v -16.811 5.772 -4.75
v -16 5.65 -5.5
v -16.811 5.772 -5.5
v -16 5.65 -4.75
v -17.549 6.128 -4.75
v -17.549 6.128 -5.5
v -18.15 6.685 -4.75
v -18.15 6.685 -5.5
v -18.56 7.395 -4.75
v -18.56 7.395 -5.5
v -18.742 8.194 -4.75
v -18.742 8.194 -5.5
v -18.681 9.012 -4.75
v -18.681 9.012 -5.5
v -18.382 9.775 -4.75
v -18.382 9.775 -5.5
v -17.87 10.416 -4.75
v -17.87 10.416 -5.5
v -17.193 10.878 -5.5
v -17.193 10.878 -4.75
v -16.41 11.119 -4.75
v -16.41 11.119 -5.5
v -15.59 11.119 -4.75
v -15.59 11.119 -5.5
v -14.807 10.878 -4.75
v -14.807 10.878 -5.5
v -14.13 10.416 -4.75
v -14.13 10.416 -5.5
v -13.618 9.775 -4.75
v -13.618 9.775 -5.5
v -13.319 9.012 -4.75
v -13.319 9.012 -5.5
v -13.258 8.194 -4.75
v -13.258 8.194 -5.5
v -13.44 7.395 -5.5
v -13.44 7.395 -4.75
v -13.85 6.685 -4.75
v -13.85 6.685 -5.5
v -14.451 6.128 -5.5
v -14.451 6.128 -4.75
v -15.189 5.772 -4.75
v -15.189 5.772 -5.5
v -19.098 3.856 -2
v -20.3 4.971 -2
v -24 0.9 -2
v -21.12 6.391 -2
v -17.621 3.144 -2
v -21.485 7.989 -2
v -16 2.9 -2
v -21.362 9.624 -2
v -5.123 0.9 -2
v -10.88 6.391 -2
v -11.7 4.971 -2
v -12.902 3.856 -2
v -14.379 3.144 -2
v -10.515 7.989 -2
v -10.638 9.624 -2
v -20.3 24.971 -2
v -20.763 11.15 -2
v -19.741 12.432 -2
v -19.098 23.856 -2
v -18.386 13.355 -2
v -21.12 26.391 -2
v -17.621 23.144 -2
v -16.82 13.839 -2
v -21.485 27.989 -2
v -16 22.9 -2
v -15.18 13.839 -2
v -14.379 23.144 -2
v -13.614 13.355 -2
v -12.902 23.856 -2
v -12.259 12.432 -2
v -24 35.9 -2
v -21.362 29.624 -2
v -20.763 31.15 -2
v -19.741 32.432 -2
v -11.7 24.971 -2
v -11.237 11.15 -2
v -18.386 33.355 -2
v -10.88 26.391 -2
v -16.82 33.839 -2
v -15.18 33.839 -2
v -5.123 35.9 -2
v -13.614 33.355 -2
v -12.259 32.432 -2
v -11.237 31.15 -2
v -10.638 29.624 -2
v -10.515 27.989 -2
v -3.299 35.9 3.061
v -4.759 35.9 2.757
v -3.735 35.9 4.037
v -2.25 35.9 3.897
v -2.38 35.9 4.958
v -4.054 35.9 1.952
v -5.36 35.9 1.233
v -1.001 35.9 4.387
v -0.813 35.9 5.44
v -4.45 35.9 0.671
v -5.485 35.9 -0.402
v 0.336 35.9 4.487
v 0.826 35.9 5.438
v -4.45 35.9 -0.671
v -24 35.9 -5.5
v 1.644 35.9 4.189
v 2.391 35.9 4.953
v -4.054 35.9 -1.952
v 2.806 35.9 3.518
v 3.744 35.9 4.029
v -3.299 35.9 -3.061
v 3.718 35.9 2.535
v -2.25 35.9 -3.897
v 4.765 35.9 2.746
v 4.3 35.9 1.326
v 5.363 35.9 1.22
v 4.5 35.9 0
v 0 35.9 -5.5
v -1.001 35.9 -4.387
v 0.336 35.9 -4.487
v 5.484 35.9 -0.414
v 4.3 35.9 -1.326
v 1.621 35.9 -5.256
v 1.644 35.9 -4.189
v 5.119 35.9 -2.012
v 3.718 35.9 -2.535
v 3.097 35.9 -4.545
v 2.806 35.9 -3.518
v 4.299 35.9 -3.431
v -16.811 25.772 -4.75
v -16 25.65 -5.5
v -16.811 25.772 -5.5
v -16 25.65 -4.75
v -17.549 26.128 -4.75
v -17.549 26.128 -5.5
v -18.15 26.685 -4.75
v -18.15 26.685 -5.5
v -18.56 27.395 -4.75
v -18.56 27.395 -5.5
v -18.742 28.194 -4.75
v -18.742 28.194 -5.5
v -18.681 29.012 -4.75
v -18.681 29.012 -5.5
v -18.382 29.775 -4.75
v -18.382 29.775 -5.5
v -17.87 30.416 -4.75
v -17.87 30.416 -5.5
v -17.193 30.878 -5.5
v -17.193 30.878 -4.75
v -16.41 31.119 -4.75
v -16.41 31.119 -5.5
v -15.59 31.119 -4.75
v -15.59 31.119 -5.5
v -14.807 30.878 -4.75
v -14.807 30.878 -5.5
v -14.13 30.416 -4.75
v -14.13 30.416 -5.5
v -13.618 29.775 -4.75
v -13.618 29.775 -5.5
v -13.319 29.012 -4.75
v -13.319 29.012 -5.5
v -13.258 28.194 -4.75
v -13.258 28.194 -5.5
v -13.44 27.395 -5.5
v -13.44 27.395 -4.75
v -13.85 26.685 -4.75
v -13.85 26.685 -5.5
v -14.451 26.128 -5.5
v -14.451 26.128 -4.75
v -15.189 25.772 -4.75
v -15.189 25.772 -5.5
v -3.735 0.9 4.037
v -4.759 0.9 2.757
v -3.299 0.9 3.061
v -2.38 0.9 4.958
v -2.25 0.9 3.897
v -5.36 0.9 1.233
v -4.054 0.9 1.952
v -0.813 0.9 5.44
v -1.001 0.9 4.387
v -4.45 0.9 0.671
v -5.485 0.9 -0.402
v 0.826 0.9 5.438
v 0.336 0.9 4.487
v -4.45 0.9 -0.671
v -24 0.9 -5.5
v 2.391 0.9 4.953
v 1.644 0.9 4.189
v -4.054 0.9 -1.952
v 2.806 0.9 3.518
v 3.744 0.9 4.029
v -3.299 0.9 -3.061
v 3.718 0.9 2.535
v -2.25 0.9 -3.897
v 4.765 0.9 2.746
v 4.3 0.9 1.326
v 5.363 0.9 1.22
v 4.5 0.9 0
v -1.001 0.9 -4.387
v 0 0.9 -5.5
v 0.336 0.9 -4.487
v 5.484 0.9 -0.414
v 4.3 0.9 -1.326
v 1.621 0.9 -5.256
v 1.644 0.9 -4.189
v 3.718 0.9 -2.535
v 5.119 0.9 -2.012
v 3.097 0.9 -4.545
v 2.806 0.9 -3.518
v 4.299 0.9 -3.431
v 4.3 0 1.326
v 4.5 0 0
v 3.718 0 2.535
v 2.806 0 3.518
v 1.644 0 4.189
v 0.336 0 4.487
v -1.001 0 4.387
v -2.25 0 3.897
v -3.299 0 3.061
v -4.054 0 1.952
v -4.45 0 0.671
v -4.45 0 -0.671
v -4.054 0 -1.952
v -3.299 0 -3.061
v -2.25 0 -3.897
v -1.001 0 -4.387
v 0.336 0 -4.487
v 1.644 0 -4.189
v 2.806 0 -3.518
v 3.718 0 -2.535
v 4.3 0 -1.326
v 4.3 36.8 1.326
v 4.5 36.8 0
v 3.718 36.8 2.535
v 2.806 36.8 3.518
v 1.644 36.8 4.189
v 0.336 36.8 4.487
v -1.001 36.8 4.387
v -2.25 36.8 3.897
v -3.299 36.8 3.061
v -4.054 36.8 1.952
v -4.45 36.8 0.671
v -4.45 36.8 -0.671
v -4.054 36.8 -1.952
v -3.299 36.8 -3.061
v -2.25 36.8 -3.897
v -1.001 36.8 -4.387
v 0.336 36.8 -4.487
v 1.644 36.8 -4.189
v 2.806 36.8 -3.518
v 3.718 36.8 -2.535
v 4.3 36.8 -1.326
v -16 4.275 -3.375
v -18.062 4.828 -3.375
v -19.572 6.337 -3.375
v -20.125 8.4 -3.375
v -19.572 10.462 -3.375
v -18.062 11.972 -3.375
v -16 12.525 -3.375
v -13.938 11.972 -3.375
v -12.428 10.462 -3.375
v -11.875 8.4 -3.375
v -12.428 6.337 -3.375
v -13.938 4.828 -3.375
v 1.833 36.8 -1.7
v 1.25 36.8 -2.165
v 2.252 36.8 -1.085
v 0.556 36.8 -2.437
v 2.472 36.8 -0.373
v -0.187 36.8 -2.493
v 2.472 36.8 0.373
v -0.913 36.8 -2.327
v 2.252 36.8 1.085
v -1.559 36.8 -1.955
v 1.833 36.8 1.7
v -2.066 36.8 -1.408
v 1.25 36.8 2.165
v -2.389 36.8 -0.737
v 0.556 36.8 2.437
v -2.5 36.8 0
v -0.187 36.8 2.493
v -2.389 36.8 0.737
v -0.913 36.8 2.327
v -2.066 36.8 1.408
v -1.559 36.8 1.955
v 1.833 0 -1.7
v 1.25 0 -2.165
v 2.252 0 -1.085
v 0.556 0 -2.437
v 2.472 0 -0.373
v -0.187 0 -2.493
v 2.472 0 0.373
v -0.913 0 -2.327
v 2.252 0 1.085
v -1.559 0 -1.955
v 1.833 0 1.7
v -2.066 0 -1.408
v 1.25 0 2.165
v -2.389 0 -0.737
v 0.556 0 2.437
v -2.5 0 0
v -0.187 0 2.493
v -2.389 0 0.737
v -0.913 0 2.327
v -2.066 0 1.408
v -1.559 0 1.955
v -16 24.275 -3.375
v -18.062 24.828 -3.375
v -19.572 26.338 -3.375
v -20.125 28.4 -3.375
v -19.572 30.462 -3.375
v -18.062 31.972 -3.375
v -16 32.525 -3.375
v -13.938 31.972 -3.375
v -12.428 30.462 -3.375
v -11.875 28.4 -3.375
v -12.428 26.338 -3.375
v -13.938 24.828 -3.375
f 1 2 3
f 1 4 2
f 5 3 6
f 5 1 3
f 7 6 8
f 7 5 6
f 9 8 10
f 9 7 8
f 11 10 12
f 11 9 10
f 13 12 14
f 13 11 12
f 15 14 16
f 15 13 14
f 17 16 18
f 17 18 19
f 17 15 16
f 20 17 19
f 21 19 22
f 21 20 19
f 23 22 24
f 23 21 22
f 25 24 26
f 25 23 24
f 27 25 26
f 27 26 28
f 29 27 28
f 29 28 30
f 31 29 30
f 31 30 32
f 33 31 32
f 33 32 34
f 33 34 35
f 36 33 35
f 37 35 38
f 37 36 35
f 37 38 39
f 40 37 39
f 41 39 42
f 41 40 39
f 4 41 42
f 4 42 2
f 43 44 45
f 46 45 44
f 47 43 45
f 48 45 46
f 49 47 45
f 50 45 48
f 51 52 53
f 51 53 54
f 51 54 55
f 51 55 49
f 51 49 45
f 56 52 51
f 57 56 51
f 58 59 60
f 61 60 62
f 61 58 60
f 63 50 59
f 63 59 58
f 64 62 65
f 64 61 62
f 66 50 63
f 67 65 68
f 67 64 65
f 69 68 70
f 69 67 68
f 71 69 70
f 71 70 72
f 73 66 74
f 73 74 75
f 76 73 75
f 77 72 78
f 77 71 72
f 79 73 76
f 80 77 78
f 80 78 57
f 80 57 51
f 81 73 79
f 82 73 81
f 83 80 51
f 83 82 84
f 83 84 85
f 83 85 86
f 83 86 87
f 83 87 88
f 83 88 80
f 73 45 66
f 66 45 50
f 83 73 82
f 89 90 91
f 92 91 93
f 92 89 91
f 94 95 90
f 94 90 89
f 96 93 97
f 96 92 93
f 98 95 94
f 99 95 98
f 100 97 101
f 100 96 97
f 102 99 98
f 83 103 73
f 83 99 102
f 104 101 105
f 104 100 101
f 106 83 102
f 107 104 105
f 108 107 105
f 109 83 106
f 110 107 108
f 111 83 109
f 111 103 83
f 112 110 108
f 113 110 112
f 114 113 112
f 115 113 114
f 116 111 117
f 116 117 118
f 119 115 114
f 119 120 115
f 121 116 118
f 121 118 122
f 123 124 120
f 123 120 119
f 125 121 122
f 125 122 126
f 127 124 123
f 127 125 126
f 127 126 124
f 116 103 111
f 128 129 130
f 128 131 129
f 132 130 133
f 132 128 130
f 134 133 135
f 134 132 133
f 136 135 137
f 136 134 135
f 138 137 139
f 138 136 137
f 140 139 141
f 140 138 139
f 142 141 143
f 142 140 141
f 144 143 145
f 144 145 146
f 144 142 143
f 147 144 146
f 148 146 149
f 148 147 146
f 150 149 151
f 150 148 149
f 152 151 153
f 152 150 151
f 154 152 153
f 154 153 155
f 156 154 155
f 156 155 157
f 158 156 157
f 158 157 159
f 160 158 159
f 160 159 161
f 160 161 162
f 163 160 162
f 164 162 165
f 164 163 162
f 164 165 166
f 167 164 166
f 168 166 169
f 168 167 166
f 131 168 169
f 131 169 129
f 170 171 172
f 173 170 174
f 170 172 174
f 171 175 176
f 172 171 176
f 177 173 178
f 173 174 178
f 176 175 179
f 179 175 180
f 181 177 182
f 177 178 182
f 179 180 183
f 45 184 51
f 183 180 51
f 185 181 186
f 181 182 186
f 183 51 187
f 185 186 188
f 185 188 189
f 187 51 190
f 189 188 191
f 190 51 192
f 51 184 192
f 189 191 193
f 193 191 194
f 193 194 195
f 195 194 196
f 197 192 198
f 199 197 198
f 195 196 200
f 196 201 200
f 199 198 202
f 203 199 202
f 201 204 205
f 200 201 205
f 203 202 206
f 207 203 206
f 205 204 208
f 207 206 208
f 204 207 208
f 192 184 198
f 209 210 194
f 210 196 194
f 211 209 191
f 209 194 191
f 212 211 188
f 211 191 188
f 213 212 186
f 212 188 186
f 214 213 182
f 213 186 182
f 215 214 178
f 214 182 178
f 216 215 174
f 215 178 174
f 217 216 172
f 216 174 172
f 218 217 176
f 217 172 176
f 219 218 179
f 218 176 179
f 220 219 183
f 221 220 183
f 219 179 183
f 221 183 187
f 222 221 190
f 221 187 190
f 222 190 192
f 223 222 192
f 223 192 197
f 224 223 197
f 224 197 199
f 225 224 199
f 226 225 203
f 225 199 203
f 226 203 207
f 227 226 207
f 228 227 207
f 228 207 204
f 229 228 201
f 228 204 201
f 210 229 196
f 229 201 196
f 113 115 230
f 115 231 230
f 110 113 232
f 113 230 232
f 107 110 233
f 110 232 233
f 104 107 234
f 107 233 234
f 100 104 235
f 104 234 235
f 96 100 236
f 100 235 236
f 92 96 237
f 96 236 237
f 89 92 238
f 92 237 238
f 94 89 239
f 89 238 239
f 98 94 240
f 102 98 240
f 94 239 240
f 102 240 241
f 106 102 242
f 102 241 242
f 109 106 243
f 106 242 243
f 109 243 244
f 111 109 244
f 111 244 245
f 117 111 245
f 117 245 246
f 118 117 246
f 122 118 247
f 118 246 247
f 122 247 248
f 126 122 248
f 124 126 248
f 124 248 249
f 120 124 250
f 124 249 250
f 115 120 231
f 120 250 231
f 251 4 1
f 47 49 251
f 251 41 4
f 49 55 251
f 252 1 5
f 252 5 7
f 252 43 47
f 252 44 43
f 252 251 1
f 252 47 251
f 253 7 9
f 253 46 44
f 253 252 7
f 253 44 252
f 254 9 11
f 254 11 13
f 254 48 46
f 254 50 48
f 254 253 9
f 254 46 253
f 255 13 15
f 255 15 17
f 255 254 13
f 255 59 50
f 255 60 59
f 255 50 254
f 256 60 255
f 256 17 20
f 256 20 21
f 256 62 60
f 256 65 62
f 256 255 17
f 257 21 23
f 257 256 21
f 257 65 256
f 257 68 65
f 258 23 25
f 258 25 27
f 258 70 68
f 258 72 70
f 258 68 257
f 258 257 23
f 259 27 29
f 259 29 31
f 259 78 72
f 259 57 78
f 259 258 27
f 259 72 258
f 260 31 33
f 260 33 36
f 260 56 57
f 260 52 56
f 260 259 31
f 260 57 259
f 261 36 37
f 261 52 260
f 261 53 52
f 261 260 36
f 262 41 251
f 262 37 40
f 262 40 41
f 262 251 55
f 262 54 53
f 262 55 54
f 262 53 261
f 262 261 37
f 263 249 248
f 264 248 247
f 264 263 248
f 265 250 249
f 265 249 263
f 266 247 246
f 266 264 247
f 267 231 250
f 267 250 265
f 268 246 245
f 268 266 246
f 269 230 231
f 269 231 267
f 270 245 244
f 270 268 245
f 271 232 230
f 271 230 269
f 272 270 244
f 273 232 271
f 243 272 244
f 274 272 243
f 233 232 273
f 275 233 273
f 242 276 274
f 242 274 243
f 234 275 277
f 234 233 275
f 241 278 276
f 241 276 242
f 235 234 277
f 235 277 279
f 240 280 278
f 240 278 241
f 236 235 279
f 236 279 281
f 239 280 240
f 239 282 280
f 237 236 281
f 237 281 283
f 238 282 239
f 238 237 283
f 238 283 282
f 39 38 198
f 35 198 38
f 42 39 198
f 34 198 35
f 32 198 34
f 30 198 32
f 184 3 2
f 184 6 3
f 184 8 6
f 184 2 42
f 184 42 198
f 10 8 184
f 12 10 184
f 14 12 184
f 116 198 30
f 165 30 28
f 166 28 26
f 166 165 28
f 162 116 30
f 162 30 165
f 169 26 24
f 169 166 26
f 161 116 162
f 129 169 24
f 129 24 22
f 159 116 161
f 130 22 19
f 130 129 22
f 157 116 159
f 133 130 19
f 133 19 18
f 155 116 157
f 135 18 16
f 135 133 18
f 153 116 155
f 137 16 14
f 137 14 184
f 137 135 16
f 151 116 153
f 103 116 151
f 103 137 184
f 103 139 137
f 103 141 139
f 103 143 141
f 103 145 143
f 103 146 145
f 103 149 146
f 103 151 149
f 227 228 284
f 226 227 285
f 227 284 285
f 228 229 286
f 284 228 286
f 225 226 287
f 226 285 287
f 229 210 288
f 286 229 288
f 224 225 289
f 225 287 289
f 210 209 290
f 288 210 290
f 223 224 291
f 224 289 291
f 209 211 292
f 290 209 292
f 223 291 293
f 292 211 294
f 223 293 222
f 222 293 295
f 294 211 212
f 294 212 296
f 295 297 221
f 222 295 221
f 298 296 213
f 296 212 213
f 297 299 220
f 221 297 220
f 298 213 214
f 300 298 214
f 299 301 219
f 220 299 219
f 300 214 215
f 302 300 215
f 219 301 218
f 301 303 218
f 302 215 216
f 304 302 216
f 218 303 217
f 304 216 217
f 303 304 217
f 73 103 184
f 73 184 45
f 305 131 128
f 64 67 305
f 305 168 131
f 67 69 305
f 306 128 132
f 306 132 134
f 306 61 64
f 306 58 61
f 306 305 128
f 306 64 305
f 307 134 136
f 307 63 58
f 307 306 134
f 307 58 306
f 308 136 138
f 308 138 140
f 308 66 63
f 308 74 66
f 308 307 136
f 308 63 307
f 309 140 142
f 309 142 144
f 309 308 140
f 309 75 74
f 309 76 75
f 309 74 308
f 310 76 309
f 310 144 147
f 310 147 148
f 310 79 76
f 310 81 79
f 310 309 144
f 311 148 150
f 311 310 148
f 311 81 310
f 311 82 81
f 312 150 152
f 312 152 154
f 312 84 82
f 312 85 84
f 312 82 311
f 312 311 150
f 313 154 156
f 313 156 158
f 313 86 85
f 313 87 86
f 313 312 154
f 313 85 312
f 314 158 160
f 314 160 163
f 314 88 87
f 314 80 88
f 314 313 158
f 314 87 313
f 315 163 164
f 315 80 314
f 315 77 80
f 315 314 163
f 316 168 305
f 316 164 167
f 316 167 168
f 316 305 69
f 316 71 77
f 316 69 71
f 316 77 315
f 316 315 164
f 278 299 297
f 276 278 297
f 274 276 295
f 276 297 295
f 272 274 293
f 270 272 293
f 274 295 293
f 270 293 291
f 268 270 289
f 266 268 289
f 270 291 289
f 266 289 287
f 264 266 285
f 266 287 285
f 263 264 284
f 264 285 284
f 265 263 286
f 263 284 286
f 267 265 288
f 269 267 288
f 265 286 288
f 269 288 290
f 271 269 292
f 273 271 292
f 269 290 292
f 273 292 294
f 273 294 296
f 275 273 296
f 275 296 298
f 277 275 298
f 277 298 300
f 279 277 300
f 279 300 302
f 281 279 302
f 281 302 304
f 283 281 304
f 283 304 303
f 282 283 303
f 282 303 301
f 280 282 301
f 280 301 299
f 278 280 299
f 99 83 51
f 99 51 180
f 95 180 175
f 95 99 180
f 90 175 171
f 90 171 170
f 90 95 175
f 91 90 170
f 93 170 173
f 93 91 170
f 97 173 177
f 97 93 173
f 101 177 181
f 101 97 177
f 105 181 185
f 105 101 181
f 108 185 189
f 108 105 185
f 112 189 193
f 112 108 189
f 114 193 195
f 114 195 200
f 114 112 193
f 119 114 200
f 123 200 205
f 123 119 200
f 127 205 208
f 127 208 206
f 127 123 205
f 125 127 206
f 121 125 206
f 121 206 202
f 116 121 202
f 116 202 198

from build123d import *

# Parameters (mm, degrees)
EXTRUDE1_DEPTH      = 35
SKETCH2_W           = 4.5
SKETCH2_H           = 0.9
SKETCH3_W           = 4.5
SKETCH3_H           = 0.9
HOLEWZD1_AT_2_COUNT = 2
HOLEWZD1_AT_2_PITCH = 20
HOLEWZD2_D          = 5
HOLEWZD2_DEPTH      = 36.8


with BuildPart() as part:
    # Sketch1 → Extrude1 (new body)
    with BuildSketch(Plane(origin=(0, 35.9, 0), x_dir=(1, 0, 0), z_dir=(0, 1, 0))):
        with BuildLine():
            Line((-24, 5.5), (-24, 2))
            Line((-24, 2), (-5.123475383, 2))
            ThreePointArc((-5.123475383, 2), (3.102418411, -4.541475531), (0, 5.5))
            Line((0, 5.5), (-24, 5.5))
        make_face()
    extrude(amount=-EXTRUDE1_DEPTH)

    # Sketch2 → Revolve1 (revolve)
    with BuildSketch(Plane.XY):
        with Locations((2.25, 0.45)):
            Rectangle(SKETCH2_W, SKETCH2_H)
    revolve(axis=Axis((0, 0.9, 0), (0, -1, 0)))

    # Sketch3 → Revolve2 (revolve)
    with BuildSketch(Plane.XY):
        with Locations((2.25, 36.35)):
            Rectangle(SKETCH3_W, SKETCH3_H)
    revolve(axis=Axis((0, 36.8, 0), (0, -1, 0)))

    # Sketch4 → HoleWzd1 (revolve, cut)
    with BuildSketch(Plane(origin=(-16, 28.4, -2), x_dir=(0, -1, 0), z_dir=(1, 0, 0))):
        Polygon((0, 0), (0, 3.5), (2.75, 3.5), (2.75, 2.75), (5.5, 0), align=None)
    holewzd1 = revolve(axis=Axis((-16, 28.4, 4.35), (0, 0, -1)), mode=Mode.SUBTRACT)

    # HoleWzd1 at 2: HoleWzd1 ×2
    with Locations(*[(0, -i * HOLEWZD1_AT_2_PITCH, 0) for i in range(1, HOLEWZD1_AT_2_COUNT)]):
        add(holewzd1, mode=Mode.SUBTRACT)

    # HoleWzd2
    with Locations(Plane(origin=(0, 36.8, 0), x_dir=(1, 0, 0), z_dir=(0, 1, 0))):
        with Locations((0, 0)):
            Hole(HOLEWZD2_D / 2, depth=HOLEWZD2_DEPTH)


solid = part.part
